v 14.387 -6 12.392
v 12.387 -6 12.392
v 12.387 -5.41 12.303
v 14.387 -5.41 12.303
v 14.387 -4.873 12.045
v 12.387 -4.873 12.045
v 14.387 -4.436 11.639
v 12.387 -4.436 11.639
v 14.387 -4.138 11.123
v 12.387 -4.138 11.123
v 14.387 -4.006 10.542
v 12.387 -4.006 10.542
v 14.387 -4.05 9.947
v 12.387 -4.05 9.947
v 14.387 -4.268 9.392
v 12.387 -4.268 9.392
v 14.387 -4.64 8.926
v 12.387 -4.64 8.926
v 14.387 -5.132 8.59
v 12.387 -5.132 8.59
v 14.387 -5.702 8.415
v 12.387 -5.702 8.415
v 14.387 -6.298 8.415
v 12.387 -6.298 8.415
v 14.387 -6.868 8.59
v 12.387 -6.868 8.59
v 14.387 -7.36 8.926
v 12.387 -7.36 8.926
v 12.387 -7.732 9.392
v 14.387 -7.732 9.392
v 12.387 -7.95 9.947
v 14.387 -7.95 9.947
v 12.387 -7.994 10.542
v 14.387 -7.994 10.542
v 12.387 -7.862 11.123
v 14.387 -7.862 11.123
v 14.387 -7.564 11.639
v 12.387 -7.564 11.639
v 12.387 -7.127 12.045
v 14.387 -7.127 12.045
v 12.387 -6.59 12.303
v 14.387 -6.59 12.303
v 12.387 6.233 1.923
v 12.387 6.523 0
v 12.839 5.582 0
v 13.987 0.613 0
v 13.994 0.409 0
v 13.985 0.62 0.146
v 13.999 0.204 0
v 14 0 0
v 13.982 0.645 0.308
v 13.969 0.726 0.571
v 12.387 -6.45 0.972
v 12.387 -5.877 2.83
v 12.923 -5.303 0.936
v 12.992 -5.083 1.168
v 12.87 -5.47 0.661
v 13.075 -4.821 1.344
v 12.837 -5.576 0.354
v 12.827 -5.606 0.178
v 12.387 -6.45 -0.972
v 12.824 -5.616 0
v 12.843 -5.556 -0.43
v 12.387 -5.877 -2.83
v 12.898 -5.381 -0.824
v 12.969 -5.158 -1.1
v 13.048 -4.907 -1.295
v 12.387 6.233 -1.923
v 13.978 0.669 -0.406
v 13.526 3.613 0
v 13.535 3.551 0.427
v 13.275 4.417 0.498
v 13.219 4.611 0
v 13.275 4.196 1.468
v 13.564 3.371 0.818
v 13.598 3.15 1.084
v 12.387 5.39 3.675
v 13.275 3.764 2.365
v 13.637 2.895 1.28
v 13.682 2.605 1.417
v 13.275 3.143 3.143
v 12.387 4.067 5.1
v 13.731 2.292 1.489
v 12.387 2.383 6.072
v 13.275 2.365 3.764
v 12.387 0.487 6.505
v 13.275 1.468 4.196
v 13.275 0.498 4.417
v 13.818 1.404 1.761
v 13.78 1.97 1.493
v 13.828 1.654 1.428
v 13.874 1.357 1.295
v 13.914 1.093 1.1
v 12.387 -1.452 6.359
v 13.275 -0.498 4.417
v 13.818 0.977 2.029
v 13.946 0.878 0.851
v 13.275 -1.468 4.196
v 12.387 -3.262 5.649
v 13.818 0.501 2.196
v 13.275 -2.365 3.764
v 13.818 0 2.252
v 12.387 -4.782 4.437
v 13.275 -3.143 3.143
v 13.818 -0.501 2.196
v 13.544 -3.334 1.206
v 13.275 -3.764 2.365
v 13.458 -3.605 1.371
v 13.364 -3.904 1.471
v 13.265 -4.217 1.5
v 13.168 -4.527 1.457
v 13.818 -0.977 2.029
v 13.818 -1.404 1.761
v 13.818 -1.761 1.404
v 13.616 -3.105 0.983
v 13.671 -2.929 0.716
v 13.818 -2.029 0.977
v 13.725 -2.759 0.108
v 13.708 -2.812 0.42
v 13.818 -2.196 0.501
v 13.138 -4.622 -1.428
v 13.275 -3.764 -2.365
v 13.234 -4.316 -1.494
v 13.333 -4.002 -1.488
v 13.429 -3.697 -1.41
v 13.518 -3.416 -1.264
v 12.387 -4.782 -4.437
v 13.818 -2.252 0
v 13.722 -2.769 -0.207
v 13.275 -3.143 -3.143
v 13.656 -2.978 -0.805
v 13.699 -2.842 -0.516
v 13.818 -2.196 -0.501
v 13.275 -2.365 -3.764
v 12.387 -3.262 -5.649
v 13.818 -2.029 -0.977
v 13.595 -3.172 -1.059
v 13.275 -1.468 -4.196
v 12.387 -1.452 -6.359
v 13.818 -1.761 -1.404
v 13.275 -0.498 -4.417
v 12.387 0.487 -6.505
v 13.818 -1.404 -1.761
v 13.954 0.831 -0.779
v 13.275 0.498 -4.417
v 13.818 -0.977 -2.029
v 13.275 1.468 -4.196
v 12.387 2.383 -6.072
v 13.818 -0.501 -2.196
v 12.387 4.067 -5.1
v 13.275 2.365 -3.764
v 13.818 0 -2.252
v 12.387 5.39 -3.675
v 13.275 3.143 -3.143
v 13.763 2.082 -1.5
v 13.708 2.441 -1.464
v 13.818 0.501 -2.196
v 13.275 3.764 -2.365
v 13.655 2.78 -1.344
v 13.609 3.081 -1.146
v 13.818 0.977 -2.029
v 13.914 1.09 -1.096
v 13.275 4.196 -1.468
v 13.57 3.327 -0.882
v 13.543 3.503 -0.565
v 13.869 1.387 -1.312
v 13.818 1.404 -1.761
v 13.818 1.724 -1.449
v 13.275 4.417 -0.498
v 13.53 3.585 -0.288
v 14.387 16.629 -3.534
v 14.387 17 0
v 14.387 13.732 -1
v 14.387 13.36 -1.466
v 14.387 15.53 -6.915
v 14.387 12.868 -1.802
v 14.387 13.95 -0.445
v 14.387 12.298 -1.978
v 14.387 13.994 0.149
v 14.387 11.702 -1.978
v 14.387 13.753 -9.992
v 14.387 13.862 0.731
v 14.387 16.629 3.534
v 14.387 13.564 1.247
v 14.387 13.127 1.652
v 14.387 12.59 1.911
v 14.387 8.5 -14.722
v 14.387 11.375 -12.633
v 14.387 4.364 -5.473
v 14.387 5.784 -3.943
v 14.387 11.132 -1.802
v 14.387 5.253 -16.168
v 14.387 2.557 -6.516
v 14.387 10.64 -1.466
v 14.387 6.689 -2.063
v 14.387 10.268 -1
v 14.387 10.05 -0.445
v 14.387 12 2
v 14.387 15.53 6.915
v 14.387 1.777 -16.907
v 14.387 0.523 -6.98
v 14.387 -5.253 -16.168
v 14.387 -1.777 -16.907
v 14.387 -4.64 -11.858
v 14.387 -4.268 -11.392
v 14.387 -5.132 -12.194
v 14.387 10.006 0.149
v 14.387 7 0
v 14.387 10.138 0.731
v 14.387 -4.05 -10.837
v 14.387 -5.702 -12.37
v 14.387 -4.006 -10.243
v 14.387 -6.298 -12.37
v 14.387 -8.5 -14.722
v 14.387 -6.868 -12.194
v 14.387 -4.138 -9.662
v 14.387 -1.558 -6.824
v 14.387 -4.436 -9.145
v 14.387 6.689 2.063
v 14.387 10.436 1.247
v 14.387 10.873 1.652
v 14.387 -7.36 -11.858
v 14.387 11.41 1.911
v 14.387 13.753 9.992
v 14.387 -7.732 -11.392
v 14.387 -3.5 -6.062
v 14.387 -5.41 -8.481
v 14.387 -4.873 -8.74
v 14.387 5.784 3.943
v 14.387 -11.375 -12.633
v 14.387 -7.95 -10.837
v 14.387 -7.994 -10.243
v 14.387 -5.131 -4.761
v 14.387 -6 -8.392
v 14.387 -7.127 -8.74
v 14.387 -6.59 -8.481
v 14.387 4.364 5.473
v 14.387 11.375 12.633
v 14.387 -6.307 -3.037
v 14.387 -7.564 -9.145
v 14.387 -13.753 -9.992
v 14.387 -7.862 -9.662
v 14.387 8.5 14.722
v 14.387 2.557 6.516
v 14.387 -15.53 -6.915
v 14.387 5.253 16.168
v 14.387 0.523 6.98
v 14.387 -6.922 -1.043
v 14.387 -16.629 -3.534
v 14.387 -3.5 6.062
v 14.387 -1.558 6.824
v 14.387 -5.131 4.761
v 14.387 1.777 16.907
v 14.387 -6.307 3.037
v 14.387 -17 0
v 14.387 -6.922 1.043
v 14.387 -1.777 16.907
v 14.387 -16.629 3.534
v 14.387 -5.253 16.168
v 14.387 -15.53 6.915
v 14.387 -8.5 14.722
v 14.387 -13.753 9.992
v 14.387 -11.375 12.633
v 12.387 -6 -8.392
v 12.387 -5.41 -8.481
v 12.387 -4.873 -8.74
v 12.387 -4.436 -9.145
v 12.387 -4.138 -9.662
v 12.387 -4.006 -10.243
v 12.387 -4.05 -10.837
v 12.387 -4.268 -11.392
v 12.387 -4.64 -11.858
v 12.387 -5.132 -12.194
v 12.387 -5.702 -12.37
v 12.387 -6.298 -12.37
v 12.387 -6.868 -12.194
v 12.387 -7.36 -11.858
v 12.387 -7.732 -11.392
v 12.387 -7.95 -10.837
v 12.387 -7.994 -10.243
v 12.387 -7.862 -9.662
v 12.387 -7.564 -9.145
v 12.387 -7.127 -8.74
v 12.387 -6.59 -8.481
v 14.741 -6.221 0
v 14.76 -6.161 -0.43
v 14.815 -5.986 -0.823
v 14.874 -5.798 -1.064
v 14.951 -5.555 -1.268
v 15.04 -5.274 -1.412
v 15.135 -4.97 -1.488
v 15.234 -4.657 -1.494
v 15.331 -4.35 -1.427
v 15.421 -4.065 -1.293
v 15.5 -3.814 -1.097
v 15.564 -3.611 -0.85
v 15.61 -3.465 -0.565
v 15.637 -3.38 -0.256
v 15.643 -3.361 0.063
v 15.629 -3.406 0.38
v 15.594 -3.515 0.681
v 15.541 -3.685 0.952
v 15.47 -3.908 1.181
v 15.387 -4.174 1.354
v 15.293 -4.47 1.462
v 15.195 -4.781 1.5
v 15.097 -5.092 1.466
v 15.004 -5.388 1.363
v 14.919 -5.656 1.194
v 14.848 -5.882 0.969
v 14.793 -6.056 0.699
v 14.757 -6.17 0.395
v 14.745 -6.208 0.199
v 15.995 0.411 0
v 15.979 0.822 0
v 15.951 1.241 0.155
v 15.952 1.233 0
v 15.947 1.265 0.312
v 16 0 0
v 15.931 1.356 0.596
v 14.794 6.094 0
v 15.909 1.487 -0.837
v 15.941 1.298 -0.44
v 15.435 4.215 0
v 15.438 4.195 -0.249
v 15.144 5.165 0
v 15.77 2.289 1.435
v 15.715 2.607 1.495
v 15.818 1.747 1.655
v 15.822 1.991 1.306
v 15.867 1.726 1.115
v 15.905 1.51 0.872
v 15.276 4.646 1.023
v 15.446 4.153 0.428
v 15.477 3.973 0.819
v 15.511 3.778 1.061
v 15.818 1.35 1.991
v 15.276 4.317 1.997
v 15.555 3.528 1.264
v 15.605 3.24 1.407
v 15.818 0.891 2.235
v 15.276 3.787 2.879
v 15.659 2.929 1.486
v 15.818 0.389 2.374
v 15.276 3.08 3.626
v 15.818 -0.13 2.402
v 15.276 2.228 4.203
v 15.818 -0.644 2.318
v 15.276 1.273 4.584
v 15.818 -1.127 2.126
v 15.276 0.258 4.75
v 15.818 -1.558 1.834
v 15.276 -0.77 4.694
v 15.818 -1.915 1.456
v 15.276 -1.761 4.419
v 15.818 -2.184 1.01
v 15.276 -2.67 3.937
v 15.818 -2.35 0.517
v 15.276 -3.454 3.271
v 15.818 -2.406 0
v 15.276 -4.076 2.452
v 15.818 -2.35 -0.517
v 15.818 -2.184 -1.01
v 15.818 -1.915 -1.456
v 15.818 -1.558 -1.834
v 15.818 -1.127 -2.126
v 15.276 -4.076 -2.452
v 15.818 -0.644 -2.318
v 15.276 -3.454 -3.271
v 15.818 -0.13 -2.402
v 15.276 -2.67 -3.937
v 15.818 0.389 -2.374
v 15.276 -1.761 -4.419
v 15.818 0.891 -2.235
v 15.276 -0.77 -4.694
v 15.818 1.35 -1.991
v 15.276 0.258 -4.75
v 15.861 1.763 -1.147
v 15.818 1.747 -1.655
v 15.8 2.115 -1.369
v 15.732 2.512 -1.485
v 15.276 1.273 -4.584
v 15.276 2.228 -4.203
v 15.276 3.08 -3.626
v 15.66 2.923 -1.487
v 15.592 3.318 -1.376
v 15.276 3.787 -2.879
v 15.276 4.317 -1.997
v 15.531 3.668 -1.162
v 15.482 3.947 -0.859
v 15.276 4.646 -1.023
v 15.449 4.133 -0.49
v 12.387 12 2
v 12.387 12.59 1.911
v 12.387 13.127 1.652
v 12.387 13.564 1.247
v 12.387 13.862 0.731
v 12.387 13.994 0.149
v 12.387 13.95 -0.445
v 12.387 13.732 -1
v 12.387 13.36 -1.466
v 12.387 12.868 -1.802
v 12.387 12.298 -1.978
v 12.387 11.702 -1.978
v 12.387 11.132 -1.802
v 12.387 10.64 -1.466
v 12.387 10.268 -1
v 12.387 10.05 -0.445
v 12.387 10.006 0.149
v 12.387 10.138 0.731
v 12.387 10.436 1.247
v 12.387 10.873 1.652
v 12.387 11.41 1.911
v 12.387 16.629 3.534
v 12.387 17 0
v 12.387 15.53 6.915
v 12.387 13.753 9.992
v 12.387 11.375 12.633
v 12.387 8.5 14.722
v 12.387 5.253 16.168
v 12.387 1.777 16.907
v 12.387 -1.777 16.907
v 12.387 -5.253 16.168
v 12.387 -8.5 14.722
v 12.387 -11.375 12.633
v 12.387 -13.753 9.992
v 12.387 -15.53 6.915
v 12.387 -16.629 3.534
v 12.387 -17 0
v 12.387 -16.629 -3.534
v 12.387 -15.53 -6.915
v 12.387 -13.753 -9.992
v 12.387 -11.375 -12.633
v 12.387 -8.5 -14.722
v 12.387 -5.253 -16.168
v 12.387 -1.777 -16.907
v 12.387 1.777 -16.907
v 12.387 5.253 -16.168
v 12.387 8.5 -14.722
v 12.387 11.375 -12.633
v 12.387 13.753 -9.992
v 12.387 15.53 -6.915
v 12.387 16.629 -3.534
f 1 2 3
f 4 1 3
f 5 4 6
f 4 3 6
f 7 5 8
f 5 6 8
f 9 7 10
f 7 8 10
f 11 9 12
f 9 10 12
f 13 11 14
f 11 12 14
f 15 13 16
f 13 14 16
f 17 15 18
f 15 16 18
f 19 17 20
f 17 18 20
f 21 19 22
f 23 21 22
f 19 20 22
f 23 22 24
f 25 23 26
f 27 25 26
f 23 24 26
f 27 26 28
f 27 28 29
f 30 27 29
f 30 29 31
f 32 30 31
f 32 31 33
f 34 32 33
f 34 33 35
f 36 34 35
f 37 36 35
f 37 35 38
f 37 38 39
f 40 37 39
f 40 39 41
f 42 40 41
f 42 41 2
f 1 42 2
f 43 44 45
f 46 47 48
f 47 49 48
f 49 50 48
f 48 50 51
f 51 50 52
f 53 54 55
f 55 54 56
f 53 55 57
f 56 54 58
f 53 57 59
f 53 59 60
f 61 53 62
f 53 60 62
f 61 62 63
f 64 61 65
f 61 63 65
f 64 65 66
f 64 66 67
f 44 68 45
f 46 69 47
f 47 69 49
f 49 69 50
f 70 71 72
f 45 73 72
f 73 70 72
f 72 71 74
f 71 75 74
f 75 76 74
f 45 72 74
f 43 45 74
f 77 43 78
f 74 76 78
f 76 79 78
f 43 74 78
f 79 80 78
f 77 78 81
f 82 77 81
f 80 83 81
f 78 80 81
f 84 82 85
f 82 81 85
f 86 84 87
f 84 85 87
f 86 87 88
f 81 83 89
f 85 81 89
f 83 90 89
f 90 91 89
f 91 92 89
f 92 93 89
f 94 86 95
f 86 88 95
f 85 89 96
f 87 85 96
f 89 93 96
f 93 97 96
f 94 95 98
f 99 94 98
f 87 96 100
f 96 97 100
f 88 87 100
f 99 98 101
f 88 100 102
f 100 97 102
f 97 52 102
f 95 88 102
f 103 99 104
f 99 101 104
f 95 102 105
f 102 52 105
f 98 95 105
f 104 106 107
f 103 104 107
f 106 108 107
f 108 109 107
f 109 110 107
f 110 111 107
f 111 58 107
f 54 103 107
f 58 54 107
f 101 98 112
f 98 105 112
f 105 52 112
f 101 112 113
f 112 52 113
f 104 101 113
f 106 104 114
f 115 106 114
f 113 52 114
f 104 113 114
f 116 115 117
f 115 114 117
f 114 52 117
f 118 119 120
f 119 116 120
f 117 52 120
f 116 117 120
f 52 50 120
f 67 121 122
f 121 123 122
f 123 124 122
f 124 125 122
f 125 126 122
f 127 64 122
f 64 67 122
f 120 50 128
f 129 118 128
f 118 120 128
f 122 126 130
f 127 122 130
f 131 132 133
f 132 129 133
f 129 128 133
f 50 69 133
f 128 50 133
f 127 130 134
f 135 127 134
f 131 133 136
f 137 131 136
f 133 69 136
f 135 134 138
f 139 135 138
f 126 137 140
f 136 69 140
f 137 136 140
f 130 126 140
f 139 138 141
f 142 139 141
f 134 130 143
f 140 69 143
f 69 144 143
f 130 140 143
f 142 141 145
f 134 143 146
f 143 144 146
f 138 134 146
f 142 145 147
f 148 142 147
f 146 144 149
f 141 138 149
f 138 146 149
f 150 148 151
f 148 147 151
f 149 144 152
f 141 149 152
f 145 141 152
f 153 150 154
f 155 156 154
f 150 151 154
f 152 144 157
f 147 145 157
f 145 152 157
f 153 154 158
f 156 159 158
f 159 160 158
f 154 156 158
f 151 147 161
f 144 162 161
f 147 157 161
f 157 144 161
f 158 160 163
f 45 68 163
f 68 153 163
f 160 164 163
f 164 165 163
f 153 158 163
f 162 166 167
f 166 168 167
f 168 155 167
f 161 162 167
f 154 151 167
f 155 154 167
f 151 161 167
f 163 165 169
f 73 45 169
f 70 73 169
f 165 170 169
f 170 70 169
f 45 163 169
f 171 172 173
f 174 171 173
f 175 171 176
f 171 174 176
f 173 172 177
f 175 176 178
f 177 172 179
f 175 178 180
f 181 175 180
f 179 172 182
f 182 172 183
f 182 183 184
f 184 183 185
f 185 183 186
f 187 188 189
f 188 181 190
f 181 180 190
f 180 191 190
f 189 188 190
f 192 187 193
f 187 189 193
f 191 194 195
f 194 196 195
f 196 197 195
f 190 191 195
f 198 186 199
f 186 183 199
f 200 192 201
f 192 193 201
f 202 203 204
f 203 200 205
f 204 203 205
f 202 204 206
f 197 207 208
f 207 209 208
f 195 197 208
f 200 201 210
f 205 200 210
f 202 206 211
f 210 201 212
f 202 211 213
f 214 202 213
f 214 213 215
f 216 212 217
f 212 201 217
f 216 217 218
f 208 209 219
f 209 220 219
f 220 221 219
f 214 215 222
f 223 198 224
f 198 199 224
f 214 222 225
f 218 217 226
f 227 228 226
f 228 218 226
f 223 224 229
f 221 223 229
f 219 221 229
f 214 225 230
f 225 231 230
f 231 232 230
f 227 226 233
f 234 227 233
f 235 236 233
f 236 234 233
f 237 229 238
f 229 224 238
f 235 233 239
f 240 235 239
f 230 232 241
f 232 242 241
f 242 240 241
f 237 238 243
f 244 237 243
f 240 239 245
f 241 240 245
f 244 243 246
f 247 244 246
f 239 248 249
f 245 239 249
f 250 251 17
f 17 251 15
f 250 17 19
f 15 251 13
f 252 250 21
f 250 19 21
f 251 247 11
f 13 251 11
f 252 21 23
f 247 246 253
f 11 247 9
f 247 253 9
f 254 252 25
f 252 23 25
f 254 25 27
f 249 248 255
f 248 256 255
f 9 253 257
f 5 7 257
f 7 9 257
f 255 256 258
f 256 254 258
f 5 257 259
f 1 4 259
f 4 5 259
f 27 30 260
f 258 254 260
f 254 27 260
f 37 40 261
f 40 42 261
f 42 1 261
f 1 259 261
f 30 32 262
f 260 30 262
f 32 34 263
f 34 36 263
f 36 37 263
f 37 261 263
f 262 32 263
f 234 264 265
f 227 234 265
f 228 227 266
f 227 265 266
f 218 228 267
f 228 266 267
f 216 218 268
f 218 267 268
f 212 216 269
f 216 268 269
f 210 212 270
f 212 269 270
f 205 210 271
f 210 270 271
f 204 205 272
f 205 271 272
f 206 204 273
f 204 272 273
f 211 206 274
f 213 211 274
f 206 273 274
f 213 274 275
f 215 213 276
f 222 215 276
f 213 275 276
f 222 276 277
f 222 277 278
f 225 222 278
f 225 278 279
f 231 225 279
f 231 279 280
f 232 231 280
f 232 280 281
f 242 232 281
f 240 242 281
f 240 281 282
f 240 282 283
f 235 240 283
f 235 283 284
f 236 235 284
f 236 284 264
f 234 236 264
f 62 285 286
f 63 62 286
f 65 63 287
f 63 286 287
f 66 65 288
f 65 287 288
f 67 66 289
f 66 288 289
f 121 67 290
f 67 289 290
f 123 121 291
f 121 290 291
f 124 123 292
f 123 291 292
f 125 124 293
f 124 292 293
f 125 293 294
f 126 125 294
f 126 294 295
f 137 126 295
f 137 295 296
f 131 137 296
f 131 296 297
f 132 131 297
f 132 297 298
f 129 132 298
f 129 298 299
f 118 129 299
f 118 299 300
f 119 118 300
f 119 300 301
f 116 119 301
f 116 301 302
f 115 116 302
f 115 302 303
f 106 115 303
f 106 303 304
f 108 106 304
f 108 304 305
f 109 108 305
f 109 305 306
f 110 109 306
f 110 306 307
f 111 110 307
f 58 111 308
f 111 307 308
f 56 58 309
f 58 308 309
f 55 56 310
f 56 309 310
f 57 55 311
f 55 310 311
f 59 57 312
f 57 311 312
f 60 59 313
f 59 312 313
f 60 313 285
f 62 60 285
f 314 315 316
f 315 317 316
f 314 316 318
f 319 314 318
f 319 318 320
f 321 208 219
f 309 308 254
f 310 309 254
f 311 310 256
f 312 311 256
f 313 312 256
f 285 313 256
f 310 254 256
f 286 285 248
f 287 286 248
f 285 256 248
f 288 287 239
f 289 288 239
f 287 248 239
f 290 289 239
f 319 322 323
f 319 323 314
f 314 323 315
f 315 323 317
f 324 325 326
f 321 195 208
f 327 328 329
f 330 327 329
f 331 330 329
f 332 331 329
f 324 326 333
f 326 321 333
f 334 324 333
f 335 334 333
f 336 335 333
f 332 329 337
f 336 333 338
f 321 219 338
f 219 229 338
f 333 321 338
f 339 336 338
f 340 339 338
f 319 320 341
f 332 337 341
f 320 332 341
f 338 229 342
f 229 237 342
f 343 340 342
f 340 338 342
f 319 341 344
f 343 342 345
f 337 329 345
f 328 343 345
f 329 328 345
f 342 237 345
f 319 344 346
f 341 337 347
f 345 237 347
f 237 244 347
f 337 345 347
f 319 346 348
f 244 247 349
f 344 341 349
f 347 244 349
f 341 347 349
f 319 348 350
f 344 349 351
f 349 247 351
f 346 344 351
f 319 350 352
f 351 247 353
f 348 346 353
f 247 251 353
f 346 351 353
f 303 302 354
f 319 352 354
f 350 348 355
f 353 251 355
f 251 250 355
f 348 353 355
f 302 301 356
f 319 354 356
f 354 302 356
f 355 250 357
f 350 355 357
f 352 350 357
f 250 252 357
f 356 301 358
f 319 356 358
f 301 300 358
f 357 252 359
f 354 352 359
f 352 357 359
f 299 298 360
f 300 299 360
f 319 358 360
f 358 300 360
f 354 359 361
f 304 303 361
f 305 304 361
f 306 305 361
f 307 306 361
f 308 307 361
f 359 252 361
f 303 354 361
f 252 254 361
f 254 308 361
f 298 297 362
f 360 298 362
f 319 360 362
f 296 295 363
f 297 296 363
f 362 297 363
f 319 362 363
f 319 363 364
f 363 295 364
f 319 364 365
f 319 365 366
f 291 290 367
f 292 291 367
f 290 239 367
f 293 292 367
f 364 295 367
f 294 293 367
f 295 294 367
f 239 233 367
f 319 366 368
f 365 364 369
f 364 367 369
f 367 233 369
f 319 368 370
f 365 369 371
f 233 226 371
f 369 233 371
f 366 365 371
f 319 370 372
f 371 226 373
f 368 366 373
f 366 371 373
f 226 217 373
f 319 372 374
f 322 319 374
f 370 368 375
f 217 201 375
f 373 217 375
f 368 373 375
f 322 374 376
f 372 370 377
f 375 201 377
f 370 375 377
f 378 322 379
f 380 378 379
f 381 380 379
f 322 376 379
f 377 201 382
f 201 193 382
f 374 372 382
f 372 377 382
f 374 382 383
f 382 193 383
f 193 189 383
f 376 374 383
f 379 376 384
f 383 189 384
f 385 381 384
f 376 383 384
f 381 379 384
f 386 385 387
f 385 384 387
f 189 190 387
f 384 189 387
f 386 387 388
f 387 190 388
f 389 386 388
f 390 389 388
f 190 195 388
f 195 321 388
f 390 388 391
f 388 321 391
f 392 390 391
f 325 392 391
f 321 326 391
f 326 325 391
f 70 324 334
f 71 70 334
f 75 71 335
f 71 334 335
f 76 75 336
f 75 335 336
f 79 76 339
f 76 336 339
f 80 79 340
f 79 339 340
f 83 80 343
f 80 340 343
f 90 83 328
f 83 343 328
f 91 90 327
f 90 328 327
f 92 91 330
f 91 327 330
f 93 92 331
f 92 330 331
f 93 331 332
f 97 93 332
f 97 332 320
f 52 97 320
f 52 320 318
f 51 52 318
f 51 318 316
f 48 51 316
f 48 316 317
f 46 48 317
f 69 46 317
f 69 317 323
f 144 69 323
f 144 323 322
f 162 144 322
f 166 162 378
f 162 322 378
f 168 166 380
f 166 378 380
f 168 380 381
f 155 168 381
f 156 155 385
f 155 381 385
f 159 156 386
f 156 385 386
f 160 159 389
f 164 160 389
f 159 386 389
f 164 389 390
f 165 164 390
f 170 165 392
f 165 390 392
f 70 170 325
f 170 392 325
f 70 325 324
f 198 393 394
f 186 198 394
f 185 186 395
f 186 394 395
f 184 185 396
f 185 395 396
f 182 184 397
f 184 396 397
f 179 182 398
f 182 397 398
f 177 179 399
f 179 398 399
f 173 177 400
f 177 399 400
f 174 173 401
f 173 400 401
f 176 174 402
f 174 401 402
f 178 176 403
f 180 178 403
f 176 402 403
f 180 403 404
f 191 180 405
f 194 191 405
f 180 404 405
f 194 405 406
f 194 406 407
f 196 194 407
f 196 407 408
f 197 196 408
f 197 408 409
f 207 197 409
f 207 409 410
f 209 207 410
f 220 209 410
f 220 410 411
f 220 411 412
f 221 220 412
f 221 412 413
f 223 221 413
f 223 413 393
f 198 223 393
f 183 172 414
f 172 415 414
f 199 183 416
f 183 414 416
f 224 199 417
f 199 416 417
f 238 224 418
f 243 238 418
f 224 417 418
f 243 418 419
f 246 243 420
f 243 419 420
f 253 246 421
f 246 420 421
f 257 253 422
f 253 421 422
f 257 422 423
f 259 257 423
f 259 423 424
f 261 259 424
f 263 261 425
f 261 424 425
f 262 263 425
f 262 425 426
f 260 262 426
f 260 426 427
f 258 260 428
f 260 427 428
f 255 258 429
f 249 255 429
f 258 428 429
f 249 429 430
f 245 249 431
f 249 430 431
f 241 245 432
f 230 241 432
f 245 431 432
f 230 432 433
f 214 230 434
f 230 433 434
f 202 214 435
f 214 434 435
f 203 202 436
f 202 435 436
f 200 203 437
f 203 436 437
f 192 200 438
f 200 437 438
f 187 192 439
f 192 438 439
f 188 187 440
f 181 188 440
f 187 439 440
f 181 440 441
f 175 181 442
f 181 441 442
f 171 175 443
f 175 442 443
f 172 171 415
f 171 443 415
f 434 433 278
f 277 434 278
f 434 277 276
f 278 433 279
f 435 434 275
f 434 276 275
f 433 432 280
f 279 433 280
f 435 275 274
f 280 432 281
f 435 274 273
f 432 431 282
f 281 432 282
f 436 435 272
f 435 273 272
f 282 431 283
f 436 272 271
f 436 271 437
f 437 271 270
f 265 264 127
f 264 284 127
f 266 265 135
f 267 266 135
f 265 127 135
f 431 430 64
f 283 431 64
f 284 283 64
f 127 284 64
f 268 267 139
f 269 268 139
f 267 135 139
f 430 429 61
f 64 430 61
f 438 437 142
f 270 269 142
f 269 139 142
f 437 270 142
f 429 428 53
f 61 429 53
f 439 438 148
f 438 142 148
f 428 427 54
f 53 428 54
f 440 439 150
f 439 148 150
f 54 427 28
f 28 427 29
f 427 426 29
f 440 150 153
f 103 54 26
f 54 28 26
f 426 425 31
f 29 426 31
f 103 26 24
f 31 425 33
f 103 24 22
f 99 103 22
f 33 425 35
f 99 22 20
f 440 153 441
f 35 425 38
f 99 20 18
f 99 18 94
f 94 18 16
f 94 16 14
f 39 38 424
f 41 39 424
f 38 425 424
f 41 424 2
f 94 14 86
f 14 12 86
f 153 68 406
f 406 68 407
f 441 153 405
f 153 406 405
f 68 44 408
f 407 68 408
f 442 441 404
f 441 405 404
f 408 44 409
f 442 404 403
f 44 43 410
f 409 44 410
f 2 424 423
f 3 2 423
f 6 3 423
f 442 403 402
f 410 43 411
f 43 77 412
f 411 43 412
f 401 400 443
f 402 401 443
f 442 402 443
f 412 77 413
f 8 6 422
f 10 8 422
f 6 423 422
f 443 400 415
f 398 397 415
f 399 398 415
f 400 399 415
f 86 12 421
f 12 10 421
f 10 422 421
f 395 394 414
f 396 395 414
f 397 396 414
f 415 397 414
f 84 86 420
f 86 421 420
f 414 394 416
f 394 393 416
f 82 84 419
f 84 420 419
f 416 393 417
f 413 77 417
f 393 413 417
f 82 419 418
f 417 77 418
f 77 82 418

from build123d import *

# Parameters (mm, degrees)
SKETCH_2_R          = 2
CUT_EXTRUDE_1_DEPTH = 10
SKETCH_8_R          = 1.5
CUT_EXTRUDE_4_DEPTH = 10
SKETCH_9_R          = 1.5
CUT_EXTRUDE_5_DEPTH = 10


with BuildPart() as part:
    # 草图1 → 旋转1 (revolve)
    with BuildSketch(Plane.XY):
        with BuildLine():
            Line((14.38749457, 7), (14.38749457, 17))
            Line((14.38749457, 17), (12.38749457, 17))
            Line((12.38749457, 17), (12.38749457, 6.523034438))
            ThreePointArc((12.38749457, 6.523034438), (13.590896291, 3.359693142), (14, 0))
            Line((14, 0), (16, 0))
            ThreePointArc((16, 0), (15.591663047, 3.591663047), (14.38749457, 7))
        make_face()
    revolve(axis=Axis((0, 0, 0), (1, 0, 0)))

    # 草图2 → 切除-拉伸1 (cut)
    with BuildSketch(Plane.ZY.offset(-12.38749457)):
        with Locations((0, 12)):
            Circle(SKETCH_2_R)
        with Locations((10.392304845, -6)):
            Circle(SKETCH_2_R)
        with Locations((-10.392304845, -6)):
            Circle(SKETCH_2_R)
    extrude(amount=-CUT_EXTRUDE_1_DEPTH, mode=Mode.SUBTRACT)

    # 草图8 → 切除-拉伸4 (cut)
    with BuildSketch(Plane(origin=(18.259852425, 3.533095909, 0), x_dir=(0, 0, -1), z_dir=(0.9537169507482267, 0.30070579950427395, 0))):
        with Locations(Location((0, 0, 0), (0, 0, 90.000000005))):
            Circle(SKETCH_8_R)
    extrude(amount=-CUT_EXTRUDE_4_DEPTH, mode=Mode.SUBTRACT)

    # 草图9 → 切除-拉伸5 (cut)
    with BuildSketch(Plane(origin=(21.271029309, -4.482516334, 0), x_dir=(0, 0, -1), z_dir=(0.9537169507482268, -0.3007057995042737, 0))):
        with Locations(Location((0, -2.121270065, 0), (0, 0, 270))):
            Circle(SKETCH_9_R)
    extrude(amount=-CUT_EXTRUDE_5_DEPTH, mode=Mode.SUBTRACT)


solid = part.part
